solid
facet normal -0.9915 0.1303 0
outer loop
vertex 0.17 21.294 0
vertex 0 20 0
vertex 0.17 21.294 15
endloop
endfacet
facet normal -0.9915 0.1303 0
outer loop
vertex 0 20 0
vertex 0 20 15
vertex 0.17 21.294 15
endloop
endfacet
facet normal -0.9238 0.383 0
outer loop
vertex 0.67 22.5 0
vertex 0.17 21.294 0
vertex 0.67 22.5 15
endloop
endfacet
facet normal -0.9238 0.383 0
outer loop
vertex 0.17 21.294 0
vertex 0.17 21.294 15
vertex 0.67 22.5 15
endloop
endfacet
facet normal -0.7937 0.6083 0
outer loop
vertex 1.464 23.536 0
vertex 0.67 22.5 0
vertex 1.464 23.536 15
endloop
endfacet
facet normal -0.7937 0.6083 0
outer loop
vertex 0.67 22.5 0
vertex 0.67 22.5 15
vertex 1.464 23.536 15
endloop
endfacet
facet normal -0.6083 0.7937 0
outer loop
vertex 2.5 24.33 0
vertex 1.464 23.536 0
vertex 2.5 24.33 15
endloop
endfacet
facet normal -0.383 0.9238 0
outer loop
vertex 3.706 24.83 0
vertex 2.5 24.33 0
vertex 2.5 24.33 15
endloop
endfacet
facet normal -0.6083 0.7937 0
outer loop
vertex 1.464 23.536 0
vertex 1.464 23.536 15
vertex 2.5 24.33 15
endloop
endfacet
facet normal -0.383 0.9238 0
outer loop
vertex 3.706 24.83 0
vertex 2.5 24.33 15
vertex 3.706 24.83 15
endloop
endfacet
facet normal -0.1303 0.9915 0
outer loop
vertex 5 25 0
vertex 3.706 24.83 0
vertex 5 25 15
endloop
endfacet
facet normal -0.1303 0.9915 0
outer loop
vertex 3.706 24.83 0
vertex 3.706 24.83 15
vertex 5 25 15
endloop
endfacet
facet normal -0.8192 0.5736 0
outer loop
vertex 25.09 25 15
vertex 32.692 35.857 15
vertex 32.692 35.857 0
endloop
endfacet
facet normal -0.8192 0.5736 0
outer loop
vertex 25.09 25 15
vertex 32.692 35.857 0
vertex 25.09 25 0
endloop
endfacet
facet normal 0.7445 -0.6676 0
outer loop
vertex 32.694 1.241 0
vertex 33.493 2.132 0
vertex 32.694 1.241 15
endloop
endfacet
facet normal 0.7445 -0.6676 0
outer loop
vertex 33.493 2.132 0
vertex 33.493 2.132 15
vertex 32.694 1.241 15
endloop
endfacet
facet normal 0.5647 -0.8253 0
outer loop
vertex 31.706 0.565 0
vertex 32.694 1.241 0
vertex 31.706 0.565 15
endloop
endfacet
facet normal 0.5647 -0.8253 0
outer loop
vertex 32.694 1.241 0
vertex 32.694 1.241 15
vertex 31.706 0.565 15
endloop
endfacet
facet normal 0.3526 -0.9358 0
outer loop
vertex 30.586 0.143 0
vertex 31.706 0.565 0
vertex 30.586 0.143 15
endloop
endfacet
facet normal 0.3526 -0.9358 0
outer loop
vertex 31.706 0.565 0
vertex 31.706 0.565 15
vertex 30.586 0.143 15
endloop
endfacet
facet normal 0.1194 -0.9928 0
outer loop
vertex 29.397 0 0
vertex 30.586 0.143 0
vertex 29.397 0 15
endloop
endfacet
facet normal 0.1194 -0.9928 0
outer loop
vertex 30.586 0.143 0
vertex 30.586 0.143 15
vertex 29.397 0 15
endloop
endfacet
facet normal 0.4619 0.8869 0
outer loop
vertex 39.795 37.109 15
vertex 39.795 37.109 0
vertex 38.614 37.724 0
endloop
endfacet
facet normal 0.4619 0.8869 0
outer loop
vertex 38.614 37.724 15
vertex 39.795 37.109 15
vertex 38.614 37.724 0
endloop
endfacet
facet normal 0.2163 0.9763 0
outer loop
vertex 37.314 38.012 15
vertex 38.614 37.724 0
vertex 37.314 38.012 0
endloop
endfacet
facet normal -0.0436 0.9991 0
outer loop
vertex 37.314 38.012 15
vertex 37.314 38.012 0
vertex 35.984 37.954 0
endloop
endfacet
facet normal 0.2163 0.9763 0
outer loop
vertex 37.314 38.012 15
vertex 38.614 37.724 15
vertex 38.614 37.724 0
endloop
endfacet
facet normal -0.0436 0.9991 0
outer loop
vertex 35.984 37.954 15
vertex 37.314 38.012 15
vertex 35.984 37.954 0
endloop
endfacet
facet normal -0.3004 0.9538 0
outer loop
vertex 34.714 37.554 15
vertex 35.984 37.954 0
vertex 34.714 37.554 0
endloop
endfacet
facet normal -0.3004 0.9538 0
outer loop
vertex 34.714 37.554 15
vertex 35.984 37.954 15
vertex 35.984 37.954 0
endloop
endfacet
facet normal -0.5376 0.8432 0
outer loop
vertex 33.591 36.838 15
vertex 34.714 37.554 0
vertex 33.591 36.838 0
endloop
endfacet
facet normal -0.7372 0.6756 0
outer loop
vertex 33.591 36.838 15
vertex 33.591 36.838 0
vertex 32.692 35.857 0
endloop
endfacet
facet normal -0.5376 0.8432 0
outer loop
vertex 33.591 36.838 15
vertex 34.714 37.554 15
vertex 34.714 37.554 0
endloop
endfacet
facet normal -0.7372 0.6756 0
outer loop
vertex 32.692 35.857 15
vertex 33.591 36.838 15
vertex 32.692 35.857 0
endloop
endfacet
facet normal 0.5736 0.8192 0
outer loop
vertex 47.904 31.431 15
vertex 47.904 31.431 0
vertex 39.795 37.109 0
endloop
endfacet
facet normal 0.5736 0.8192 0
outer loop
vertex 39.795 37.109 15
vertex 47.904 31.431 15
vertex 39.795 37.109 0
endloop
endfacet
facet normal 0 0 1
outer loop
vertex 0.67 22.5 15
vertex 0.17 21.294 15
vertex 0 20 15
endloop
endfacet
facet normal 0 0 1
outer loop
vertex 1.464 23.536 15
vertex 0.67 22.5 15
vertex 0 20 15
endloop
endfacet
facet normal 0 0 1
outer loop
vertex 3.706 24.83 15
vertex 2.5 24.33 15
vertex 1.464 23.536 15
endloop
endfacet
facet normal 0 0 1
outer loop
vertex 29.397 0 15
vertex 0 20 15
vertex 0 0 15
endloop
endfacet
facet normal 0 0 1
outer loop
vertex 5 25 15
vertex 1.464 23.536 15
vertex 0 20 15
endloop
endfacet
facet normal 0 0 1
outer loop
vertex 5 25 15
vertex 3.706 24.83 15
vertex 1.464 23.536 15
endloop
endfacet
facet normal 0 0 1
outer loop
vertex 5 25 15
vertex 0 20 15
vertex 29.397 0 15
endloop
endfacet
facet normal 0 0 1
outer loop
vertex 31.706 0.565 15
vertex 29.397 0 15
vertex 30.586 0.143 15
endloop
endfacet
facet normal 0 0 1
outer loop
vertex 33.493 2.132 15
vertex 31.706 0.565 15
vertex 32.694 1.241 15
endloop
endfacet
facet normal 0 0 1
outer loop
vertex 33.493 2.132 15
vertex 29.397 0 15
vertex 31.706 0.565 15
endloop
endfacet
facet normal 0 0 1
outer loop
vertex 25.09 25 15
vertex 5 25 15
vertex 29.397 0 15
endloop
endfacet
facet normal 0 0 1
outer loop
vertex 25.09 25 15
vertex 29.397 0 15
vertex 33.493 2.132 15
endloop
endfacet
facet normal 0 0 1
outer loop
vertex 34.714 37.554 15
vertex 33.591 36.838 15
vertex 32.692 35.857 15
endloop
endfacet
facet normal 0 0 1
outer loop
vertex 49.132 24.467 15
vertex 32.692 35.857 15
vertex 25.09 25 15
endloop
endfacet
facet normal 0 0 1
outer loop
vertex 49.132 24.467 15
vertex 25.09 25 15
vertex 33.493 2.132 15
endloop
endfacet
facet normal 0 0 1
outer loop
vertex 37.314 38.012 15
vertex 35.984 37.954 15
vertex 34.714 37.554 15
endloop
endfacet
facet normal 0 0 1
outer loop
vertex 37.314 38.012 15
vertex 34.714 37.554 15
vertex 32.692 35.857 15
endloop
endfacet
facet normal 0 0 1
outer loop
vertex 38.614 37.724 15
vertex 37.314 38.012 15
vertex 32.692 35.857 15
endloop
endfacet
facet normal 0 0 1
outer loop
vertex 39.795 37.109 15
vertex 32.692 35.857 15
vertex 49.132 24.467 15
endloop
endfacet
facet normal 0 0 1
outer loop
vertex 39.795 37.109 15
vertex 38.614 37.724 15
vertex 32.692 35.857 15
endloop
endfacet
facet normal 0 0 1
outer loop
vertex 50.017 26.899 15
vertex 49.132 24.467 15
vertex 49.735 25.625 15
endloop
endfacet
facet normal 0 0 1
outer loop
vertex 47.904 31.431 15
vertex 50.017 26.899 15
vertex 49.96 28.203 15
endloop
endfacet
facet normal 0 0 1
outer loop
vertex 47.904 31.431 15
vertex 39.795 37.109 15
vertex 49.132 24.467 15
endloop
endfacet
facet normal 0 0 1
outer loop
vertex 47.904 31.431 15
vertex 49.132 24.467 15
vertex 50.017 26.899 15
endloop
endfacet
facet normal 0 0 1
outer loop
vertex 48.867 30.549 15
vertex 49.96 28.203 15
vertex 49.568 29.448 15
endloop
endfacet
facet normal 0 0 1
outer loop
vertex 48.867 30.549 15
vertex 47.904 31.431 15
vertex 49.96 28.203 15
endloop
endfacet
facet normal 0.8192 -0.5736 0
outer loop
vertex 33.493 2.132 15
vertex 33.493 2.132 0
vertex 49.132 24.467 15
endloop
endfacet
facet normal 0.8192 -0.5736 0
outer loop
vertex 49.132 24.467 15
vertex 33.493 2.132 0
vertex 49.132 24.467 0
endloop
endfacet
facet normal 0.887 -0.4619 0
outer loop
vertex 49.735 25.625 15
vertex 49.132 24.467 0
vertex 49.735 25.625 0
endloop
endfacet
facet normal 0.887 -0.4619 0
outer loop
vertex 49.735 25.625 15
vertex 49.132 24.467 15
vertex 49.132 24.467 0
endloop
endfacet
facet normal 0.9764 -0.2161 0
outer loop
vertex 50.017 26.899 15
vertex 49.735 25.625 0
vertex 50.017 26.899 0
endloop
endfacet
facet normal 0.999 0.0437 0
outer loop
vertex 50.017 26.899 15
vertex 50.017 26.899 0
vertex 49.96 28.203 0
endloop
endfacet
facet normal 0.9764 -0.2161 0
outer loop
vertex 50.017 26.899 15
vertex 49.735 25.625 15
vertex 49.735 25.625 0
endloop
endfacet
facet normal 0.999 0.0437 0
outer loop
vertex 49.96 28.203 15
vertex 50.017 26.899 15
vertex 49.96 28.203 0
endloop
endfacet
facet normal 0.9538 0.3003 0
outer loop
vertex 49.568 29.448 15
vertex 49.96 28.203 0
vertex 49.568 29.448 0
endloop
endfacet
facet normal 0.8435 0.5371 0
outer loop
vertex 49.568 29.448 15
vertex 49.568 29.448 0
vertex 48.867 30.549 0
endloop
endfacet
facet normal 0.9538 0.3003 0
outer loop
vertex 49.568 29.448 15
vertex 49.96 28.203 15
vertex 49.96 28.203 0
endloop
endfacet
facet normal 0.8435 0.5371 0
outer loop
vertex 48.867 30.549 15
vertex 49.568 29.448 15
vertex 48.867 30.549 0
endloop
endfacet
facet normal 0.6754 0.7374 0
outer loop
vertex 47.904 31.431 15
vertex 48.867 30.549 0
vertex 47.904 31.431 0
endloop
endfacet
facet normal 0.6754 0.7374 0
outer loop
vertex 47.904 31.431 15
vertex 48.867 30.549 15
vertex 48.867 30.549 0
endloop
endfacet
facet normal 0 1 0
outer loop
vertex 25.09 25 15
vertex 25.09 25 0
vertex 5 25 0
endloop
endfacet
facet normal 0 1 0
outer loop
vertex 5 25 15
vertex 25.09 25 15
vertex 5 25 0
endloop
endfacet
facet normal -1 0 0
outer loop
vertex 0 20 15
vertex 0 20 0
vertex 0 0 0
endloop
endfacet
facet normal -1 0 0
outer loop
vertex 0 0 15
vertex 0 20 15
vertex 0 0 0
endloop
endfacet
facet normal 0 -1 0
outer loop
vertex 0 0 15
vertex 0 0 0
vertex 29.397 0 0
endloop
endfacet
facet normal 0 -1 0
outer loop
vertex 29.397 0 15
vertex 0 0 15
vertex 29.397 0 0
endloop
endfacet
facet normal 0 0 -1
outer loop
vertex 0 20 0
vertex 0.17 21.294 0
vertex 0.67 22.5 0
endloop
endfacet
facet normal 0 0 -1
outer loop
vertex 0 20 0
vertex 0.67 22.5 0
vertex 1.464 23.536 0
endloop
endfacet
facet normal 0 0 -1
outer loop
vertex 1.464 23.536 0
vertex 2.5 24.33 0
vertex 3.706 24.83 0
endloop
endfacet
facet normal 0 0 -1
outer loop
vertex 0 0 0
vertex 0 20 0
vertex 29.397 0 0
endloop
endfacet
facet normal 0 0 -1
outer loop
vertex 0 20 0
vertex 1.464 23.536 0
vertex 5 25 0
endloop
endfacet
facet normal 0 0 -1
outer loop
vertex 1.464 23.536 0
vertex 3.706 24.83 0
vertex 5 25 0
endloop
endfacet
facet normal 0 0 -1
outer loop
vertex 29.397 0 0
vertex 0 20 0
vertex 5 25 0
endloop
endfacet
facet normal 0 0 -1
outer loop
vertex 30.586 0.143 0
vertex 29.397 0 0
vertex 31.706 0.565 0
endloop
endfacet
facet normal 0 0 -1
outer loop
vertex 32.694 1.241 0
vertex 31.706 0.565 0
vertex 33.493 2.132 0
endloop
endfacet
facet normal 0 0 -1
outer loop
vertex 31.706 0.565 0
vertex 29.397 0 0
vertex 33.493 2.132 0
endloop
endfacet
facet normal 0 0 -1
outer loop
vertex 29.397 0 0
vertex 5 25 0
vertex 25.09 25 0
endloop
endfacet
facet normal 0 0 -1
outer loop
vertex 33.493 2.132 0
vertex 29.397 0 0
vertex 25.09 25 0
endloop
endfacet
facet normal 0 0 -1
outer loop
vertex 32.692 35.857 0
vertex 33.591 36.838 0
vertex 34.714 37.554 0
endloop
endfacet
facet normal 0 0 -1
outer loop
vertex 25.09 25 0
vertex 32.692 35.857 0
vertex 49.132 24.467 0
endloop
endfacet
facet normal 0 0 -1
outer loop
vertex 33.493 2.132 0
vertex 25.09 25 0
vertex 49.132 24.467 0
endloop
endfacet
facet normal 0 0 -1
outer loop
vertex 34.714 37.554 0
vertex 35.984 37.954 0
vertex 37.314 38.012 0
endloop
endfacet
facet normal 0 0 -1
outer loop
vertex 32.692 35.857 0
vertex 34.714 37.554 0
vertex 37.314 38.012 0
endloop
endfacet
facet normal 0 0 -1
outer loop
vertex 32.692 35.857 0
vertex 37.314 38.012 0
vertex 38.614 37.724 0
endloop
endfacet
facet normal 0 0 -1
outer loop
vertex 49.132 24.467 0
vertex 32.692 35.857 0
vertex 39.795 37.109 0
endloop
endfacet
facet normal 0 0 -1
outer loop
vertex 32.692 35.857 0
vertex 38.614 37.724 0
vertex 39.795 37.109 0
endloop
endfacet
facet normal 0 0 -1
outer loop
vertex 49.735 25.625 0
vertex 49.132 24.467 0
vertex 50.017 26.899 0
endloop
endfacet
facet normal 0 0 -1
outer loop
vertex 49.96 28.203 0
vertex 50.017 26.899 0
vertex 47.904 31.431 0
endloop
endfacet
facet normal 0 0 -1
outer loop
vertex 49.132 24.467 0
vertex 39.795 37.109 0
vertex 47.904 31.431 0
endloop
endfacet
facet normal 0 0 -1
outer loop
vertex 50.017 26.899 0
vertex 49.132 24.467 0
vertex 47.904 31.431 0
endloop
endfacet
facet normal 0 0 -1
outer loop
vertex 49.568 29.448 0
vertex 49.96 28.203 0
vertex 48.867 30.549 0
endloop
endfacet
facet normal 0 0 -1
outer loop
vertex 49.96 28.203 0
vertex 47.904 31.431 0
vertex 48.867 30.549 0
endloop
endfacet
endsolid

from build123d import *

# Parameters (mm, degrees)
EXTRUDE_1_DEPTH = 15
FILLET_1_R      = 5.1
FILLET_2_R      = 5
FILLET_3_R      = 5
FILLET_4_R      = 5


with BuildPart() as part:
    # 스케치1 → 보스-돌출1 (new body)
    with BuildSketch(Plane.XY):
        Polygon((0, 0), (32, 0), (52, 28.562960135), (35.616959114, 40.034488862), (25.08969668, 25), (0, 25), align=None)
    extrude(amount=EXTRUDE_1_DEPTH)

    # 필렛1
    fillet_1_edges = [part.edges().sort_by_distance(p)[0] for p in [
        (35.616959114, 40.034488862, 7.5),
    ]]
    fillet(fillet_1_edges, radius=FILLET_1_R)

    # 필렛2
    fillet_2_edges = [part.edges().sort_by_distance(p)[0] for p in [
        (32, 0, 7.5),
    ]]
    fillet(fillet_2_edges, radius=FILLET_2_R)

    # 필렛3
    fillet_3_edges = [part.edges().sort_by_distance(p)[0] for p in [
        (0, 25, 7.5),
    ]]
    fillet(fillet_3_edges, radius=FILLET_3_R)

    # 필렛4
    fillet_4_edges = [part.edges().sort_by_distance(p)[0] for p in [
        (52, 28.562960135, 7.5),
    ]]
    fillet(fillet_4_edges, radius=FILLET_4_R)


solid = part.part
